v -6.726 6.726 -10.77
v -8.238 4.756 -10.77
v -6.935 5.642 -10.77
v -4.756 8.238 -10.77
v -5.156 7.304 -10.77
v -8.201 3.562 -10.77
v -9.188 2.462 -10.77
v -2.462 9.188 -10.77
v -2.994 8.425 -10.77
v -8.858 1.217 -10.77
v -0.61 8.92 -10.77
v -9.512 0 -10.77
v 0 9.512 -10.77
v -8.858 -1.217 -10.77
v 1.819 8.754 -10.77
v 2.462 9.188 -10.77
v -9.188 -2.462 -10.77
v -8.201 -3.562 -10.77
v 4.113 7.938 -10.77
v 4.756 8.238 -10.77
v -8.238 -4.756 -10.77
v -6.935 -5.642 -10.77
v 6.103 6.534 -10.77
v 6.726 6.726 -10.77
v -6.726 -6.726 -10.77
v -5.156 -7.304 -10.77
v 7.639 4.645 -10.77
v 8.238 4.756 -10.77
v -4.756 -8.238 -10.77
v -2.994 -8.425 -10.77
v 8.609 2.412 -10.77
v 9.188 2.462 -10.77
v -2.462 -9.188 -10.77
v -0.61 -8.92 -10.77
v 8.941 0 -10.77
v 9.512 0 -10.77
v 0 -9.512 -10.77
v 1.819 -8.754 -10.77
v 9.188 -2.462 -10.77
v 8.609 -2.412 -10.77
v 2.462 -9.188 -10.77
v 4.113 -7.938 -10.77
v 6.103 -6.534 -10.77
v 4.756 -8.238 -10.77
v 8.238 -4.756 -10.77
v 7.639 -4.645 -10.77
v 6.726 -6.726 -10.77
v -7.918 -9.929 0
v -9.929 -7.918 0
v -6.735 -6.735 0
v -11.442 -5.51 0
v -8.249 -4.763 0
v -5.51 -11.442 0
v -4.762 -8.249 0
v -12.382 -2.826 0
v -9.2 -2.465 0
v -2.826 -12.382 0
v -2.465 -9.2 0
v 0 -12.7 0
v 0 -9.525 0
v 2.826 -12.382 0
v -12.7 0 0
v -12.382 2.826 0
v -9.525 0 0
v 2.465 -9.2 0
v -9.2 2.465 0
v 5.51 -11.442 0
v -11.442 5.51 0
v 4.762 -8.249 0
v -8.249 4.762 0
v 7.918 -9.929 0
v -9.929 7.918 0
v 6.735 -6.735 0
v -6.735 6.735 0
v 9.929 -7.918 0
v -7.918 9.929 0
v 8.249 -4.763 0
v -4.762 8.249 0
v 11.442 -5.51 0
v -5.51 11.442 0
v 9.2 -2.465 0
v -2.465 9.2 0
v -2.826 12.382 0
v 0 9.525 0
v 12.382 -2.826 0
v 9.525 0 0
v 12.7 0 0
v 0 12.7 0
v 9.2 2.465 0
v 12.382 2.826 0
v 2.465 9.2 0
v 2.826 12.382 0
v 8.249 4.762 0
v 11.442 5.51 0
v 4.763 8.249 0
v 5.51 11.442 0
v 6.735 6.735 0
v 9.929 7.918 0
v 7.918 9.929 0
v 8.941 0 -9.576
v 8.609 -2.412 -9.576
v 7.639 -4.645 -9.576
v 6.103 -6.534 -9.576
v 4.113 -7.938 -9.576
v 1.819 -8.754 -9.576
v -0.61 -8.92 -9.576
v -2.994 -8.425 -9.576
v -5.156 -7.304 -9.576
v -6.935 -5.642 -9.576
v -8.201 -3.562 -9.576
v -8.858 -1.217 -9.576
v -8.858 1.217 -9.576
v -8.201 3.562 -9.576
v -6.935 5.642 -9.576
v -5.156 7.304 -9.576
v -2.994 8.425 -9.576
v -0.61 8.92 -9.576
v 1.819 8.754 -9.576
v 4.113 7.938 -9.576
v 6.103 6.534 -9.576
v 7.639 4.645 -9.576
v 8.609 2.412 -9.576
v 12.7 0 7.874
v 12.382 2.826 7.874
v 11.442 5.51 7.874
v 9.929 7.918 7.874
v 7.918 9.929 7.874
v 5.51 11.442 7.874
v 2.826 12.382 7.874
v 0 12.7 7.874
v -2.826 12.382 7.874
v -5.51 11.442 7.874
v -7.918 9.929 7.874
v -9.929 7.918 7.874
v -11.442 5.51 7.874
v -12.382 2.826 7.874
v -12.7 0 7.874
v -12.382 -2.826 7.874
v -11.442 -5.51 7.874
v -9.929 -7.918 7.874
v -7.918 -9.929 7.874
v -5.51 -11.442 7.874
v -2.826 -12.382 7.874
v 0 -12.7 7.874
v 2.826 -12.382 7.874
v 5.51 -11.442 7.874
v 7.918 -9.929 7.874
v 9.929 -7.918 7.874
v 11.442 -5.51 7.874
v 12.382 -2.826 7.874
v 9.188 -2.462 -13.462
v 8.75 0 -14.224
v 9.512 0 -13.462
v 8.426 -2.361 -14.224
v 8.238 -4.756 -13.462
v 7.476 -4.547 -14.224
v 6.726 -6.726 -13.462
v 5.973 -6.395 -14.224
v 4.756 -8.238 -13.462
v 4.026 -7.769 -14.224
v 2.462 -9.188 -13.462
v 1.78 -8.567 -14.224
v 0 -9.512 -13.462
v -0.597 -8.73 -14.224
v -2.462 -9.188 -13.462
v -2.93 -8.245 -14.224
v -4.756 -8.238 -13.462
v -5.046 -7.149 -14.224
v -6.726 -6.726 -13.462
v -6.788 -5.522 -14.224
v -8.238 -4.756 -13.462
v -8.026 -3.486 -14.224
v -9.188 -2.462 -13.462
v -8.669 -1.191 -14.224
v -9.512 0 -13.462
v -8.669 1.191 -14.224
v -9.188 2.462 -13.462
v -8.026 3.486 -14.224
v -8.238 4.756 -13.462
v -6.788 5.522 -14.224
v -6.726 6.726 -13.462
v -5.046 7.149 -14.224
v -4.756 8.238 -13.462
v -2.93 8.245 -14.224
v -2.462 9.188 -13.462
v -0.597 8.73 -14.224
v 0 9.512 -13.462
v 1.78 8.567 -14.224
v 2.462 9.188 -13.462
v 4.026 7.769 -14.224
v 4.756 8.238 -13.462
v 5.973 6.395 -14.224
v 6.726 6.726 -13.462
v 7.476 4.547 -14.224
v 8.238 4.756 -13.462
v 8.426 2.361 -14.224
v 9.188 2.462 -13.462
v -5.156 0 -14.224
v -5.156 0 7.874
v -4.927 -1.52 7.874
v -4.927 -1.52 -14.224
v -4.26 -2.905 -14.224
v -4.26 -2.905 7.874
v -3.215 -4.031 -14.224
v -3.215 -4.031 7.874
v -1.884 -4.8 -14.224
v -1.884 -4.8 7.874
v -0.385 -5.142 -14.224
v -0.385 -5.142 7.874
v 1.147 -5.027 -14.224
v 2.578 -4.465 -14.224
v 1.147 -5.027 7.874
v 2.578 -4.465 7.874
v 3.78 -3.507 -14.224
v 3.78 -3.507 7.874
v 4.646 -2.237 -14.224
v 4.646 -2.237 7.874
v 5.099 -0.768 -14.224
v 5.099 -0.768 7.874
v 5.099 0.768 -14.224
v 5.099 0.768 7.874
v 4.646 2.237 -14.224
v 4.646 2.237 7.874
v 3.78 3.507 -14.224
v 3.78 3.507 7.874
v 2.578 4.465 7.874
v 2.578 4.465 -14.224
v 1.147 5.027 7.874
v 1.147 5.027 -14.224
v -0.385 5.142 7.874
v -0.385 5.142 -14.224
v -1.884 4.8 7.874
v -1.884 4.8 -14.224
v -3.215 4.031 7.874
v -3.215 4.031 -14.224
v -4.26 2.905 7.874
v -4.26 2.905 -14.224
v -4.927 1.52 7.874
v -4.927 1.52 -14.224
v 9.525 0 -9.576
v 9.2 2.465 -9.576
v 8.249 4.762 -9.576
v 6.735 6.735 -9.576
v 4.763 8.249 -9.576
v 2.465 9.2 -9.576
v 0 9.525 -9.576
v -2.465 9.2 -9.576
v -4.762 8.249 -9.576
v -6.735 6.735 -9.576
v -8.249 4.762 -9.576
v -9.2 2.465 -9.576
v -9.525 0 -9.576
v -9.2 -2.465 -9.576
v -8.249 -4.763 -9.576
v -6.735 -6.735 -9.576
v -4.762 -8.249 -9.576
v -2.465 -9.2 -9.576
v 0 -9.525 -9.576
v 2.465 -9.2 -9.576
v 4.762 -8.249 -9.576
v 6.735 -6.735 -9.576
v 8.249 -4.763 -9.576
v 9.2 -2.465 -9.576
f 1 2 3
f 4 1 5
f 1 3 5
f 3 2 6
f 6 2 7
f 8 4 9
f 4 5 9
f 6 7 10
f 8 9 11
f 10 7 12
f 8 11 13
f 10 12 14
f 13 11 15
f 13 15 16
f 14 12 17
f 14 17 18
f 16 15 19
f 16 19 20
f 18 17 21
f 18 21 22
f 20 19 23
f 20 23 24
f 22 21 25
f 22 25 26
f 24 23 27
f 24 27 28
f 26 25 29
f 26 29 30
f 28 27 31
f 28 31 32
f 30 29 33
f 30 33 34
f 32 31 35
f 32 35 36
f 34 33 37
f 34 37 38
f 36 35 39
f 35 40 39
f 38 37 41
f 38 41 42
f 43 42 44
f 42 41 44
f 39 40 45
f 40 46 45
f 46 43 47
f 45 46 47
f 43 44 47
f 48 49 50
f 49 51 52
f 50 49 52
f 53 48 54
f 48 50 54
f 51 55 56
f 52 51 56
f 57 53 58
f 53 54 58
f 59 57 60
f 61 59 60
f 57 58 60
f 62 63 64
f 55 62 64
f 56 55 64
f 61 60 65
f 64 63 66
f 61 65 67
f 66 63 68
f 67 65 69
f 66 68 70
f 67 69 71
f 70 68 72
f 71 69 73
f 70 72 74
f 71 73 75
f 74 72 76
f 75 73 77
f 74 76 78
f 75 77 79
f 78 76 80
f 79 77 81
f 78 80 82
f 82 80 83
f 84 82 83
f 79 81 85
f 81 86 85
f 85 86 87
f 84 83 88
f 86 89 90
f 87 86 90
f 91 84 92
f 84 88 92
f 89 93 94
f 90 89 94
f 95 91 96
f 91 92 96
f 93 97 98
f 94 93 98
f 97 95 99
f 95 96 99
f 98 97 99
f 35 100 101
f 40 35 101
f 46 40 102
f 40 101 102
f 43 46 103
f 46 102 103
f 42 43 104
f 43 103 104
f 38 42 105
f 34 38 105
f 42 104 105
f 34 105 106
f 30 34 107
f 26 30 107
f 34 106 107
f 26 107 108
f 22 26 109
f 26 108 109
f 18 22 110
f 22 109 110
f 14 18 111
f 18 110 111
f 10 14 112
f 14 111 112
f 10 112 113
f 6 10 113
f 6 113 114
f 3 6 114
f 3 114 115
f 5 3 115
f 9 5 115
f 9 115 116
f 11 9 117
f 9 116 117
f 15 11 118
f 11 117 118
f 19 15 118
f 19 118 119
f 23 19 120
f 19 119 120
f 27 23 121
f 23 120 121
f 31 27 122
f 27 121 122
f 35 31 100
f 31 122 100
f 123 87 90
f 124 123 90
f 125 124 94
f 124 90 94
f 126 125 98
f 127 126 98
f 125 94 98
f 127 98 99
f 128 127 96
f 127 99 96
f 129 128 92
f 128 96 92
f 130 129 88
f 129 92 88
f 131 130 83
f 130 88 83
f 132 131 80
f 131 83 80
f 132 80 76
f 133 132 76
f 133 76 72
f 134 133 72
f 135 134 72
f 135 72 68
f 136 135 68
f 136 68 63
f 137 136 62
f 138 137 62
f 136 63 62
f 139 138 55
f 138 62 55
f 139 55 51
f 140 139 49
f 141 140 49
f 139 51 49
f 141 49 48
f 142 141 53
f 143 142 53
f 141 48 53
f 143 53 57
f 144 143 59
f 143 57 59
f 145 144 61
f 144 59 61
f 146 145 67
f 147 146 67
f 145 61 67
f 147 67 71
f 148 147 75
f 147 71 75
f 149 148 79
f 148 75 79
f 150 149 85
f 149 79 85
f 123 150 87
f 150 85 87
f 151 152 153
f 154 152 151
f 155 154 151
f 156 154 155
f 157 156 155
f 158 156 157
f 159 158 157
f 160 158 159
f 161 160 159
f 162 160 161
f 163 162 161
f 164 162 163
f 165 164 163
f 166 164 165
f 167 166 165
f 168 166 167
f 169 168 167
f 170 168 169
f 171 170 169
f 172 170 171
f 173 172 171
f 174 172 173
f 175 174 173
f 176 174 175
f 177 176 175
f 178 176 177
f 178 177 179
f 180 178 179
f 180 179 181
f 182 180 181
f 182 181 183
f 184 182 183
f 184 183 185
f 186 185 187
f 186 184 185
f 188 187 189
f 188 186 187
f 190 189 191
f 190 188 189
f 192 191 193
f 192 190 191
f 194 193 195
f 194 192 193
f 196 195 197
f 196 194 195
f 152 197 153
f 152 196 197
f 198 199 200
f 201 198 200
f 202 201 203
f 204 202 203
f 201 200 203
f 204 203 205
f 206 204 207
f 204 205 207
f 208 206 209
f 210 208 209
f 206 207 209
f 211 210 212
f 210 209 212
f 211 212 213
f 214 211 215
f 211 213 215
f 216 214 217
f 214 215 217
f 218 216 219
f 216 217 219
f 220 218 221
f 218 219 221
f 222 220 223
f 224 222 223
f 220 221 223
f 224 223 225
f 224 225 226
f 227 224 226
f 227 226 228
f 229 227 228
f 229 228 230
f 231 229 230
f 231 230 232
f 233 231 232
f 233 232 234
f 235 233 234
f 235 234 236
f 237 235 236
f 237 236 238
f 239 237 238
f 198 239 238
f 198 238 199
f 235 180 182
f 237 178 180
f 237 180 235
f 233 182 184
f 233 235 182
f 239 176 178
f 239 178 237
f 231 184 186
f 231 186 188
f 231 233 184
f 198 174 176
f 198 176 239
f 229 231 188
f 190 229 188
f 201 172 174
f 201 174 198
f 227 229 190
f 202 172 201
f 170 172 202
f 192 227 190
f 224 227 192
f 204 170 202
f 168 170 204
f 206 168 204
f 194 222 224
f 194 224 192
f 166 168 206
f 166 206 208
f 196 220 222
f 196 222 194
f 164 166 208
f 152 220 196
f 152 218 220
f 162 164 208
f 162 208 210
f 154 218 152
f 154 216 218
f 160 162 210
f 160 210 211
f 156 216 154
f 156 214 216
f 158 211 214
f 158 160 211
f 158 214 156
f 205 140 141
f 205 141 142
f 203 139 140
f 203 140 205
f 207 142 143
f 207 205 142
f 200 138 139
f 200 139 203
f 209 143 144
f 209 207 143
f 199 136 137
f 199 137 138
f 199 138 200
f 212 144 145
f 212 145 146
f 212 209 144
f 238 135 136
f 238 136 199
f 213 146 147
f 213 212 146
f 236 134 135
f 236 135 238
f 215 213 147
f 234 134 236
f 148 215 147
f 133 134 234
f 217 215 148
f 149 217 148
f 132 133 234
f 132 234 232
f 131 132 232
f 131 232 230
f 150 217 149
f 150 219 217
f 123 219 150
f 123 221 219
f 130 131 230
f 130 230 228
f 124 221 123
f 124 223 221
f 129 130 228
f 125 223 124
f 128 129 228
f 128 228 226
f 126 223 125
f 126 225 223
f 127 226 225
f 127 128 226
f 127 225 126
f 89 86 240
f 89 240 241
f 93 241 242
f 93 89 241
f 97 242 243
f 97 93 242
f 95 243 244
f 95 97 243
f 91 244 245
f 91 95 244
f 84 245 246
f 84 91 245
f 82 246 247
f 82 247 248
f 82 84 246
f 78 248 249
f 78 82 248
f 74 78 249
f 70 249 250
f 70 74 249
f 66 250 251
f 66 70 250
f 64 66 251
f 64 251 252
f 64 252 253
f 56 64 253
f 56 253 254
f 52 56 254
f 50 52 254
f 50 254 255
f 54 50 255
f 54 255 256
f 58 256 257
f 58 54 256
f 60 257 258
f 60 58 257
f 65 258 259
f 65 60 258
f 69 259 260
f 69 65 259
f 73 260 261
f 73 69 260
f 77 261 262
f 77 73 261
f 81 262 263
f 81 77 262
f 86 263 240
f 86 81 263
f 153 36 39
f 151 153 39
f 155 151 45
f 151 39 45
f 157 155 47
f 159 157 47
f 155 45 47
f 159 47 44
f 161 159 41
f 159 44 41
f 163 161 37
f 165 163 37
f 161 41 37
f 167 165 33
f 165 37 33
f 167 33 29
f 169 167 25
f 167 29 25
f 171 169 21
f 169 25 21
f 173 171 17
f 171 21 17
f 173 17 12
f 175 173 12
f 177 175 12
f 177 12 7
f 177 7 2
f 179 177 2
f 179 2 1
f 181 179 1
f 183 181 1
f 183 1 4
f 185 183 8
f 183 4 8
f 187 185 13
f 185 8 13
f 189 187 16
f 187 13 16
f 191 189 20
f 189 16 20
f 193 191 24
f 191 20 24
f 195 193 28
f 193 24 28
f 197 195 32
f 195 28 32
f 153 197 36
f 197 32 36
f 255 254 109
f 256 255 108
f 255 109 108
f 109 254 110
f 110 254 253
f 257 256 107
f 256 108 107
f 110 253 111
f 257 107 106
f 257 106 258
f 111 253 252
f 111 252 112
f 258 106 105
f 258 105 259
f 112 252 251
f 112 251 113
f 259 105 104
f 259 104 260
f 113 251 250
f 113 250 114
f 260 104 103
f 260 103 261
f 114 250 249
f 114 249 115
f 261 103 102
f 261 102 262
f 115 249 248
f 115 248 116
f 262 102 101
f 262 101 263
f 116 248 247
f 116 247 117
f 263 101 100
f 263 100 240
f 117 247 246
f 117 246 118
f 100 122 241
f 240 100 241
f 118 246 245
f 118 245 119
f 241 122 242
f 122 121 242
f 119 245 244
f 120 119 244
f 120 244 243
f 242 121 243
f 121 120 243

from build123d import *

# Parameters (mm, degrees)
F0_R     = 12.7
F1_DEPTH = 7.874
F2_R     = 9.525
F3_DEPTH = 9.5758
F4_R     = 8.9408
F5_DEPTH = 1.1938
F6_R     = 9.5123
F7_DEPTH = 3.4544
F8_SIZE  = 0.762
F10_D    = 10.3124


with BuildPart() as f1:
    # F0 (on Top) → F1 (new body)
    with BuildSketch(Plane.XY):
        Circle(F0_R)
    extrude(amount=F1_DEPTH)

    # F2 (on Top) → F3 (join)
    with BuildSketch(Plane.XY):
        Circle(F2_R)
    extrude(amount=-F3_DEPTH)

    # F4 (on face) → F5 (join)
    with BuildSketch(Plane(origin=(0, 0, -9.5758), x_dir=(1, 0, 0), z_dir=(0, 0, -1))):
        Circle(F4_R)
    extrude(amount=F5_DEPTH)

    # F6 (on face) → F7 (join)
    with BuildSketch(Plane(origin=(0, 0, -10.7696), x_dir=(1, 0, 0), z_dir=(0, 0, -1))):
        Circle(F6_R)
    extrude(amount=F7_DEPTH)

    # F8
    f8_edges = [f1.edges().sort_by_distance(p)[0] for p in [
        (-9.5123, 0, -14.224),
    ]]
    chamfer(f8_edges, length=F8_SIZE)

    # F10 (through all)
    with Locations(Plane(origin=(0, 0, -14.224), x_dir=(1, 0, 0), z_dir=(0, 0, -1))):
        with Locations((0, 0)):
            Hole(F10_D / 2)


solid = f1.part
